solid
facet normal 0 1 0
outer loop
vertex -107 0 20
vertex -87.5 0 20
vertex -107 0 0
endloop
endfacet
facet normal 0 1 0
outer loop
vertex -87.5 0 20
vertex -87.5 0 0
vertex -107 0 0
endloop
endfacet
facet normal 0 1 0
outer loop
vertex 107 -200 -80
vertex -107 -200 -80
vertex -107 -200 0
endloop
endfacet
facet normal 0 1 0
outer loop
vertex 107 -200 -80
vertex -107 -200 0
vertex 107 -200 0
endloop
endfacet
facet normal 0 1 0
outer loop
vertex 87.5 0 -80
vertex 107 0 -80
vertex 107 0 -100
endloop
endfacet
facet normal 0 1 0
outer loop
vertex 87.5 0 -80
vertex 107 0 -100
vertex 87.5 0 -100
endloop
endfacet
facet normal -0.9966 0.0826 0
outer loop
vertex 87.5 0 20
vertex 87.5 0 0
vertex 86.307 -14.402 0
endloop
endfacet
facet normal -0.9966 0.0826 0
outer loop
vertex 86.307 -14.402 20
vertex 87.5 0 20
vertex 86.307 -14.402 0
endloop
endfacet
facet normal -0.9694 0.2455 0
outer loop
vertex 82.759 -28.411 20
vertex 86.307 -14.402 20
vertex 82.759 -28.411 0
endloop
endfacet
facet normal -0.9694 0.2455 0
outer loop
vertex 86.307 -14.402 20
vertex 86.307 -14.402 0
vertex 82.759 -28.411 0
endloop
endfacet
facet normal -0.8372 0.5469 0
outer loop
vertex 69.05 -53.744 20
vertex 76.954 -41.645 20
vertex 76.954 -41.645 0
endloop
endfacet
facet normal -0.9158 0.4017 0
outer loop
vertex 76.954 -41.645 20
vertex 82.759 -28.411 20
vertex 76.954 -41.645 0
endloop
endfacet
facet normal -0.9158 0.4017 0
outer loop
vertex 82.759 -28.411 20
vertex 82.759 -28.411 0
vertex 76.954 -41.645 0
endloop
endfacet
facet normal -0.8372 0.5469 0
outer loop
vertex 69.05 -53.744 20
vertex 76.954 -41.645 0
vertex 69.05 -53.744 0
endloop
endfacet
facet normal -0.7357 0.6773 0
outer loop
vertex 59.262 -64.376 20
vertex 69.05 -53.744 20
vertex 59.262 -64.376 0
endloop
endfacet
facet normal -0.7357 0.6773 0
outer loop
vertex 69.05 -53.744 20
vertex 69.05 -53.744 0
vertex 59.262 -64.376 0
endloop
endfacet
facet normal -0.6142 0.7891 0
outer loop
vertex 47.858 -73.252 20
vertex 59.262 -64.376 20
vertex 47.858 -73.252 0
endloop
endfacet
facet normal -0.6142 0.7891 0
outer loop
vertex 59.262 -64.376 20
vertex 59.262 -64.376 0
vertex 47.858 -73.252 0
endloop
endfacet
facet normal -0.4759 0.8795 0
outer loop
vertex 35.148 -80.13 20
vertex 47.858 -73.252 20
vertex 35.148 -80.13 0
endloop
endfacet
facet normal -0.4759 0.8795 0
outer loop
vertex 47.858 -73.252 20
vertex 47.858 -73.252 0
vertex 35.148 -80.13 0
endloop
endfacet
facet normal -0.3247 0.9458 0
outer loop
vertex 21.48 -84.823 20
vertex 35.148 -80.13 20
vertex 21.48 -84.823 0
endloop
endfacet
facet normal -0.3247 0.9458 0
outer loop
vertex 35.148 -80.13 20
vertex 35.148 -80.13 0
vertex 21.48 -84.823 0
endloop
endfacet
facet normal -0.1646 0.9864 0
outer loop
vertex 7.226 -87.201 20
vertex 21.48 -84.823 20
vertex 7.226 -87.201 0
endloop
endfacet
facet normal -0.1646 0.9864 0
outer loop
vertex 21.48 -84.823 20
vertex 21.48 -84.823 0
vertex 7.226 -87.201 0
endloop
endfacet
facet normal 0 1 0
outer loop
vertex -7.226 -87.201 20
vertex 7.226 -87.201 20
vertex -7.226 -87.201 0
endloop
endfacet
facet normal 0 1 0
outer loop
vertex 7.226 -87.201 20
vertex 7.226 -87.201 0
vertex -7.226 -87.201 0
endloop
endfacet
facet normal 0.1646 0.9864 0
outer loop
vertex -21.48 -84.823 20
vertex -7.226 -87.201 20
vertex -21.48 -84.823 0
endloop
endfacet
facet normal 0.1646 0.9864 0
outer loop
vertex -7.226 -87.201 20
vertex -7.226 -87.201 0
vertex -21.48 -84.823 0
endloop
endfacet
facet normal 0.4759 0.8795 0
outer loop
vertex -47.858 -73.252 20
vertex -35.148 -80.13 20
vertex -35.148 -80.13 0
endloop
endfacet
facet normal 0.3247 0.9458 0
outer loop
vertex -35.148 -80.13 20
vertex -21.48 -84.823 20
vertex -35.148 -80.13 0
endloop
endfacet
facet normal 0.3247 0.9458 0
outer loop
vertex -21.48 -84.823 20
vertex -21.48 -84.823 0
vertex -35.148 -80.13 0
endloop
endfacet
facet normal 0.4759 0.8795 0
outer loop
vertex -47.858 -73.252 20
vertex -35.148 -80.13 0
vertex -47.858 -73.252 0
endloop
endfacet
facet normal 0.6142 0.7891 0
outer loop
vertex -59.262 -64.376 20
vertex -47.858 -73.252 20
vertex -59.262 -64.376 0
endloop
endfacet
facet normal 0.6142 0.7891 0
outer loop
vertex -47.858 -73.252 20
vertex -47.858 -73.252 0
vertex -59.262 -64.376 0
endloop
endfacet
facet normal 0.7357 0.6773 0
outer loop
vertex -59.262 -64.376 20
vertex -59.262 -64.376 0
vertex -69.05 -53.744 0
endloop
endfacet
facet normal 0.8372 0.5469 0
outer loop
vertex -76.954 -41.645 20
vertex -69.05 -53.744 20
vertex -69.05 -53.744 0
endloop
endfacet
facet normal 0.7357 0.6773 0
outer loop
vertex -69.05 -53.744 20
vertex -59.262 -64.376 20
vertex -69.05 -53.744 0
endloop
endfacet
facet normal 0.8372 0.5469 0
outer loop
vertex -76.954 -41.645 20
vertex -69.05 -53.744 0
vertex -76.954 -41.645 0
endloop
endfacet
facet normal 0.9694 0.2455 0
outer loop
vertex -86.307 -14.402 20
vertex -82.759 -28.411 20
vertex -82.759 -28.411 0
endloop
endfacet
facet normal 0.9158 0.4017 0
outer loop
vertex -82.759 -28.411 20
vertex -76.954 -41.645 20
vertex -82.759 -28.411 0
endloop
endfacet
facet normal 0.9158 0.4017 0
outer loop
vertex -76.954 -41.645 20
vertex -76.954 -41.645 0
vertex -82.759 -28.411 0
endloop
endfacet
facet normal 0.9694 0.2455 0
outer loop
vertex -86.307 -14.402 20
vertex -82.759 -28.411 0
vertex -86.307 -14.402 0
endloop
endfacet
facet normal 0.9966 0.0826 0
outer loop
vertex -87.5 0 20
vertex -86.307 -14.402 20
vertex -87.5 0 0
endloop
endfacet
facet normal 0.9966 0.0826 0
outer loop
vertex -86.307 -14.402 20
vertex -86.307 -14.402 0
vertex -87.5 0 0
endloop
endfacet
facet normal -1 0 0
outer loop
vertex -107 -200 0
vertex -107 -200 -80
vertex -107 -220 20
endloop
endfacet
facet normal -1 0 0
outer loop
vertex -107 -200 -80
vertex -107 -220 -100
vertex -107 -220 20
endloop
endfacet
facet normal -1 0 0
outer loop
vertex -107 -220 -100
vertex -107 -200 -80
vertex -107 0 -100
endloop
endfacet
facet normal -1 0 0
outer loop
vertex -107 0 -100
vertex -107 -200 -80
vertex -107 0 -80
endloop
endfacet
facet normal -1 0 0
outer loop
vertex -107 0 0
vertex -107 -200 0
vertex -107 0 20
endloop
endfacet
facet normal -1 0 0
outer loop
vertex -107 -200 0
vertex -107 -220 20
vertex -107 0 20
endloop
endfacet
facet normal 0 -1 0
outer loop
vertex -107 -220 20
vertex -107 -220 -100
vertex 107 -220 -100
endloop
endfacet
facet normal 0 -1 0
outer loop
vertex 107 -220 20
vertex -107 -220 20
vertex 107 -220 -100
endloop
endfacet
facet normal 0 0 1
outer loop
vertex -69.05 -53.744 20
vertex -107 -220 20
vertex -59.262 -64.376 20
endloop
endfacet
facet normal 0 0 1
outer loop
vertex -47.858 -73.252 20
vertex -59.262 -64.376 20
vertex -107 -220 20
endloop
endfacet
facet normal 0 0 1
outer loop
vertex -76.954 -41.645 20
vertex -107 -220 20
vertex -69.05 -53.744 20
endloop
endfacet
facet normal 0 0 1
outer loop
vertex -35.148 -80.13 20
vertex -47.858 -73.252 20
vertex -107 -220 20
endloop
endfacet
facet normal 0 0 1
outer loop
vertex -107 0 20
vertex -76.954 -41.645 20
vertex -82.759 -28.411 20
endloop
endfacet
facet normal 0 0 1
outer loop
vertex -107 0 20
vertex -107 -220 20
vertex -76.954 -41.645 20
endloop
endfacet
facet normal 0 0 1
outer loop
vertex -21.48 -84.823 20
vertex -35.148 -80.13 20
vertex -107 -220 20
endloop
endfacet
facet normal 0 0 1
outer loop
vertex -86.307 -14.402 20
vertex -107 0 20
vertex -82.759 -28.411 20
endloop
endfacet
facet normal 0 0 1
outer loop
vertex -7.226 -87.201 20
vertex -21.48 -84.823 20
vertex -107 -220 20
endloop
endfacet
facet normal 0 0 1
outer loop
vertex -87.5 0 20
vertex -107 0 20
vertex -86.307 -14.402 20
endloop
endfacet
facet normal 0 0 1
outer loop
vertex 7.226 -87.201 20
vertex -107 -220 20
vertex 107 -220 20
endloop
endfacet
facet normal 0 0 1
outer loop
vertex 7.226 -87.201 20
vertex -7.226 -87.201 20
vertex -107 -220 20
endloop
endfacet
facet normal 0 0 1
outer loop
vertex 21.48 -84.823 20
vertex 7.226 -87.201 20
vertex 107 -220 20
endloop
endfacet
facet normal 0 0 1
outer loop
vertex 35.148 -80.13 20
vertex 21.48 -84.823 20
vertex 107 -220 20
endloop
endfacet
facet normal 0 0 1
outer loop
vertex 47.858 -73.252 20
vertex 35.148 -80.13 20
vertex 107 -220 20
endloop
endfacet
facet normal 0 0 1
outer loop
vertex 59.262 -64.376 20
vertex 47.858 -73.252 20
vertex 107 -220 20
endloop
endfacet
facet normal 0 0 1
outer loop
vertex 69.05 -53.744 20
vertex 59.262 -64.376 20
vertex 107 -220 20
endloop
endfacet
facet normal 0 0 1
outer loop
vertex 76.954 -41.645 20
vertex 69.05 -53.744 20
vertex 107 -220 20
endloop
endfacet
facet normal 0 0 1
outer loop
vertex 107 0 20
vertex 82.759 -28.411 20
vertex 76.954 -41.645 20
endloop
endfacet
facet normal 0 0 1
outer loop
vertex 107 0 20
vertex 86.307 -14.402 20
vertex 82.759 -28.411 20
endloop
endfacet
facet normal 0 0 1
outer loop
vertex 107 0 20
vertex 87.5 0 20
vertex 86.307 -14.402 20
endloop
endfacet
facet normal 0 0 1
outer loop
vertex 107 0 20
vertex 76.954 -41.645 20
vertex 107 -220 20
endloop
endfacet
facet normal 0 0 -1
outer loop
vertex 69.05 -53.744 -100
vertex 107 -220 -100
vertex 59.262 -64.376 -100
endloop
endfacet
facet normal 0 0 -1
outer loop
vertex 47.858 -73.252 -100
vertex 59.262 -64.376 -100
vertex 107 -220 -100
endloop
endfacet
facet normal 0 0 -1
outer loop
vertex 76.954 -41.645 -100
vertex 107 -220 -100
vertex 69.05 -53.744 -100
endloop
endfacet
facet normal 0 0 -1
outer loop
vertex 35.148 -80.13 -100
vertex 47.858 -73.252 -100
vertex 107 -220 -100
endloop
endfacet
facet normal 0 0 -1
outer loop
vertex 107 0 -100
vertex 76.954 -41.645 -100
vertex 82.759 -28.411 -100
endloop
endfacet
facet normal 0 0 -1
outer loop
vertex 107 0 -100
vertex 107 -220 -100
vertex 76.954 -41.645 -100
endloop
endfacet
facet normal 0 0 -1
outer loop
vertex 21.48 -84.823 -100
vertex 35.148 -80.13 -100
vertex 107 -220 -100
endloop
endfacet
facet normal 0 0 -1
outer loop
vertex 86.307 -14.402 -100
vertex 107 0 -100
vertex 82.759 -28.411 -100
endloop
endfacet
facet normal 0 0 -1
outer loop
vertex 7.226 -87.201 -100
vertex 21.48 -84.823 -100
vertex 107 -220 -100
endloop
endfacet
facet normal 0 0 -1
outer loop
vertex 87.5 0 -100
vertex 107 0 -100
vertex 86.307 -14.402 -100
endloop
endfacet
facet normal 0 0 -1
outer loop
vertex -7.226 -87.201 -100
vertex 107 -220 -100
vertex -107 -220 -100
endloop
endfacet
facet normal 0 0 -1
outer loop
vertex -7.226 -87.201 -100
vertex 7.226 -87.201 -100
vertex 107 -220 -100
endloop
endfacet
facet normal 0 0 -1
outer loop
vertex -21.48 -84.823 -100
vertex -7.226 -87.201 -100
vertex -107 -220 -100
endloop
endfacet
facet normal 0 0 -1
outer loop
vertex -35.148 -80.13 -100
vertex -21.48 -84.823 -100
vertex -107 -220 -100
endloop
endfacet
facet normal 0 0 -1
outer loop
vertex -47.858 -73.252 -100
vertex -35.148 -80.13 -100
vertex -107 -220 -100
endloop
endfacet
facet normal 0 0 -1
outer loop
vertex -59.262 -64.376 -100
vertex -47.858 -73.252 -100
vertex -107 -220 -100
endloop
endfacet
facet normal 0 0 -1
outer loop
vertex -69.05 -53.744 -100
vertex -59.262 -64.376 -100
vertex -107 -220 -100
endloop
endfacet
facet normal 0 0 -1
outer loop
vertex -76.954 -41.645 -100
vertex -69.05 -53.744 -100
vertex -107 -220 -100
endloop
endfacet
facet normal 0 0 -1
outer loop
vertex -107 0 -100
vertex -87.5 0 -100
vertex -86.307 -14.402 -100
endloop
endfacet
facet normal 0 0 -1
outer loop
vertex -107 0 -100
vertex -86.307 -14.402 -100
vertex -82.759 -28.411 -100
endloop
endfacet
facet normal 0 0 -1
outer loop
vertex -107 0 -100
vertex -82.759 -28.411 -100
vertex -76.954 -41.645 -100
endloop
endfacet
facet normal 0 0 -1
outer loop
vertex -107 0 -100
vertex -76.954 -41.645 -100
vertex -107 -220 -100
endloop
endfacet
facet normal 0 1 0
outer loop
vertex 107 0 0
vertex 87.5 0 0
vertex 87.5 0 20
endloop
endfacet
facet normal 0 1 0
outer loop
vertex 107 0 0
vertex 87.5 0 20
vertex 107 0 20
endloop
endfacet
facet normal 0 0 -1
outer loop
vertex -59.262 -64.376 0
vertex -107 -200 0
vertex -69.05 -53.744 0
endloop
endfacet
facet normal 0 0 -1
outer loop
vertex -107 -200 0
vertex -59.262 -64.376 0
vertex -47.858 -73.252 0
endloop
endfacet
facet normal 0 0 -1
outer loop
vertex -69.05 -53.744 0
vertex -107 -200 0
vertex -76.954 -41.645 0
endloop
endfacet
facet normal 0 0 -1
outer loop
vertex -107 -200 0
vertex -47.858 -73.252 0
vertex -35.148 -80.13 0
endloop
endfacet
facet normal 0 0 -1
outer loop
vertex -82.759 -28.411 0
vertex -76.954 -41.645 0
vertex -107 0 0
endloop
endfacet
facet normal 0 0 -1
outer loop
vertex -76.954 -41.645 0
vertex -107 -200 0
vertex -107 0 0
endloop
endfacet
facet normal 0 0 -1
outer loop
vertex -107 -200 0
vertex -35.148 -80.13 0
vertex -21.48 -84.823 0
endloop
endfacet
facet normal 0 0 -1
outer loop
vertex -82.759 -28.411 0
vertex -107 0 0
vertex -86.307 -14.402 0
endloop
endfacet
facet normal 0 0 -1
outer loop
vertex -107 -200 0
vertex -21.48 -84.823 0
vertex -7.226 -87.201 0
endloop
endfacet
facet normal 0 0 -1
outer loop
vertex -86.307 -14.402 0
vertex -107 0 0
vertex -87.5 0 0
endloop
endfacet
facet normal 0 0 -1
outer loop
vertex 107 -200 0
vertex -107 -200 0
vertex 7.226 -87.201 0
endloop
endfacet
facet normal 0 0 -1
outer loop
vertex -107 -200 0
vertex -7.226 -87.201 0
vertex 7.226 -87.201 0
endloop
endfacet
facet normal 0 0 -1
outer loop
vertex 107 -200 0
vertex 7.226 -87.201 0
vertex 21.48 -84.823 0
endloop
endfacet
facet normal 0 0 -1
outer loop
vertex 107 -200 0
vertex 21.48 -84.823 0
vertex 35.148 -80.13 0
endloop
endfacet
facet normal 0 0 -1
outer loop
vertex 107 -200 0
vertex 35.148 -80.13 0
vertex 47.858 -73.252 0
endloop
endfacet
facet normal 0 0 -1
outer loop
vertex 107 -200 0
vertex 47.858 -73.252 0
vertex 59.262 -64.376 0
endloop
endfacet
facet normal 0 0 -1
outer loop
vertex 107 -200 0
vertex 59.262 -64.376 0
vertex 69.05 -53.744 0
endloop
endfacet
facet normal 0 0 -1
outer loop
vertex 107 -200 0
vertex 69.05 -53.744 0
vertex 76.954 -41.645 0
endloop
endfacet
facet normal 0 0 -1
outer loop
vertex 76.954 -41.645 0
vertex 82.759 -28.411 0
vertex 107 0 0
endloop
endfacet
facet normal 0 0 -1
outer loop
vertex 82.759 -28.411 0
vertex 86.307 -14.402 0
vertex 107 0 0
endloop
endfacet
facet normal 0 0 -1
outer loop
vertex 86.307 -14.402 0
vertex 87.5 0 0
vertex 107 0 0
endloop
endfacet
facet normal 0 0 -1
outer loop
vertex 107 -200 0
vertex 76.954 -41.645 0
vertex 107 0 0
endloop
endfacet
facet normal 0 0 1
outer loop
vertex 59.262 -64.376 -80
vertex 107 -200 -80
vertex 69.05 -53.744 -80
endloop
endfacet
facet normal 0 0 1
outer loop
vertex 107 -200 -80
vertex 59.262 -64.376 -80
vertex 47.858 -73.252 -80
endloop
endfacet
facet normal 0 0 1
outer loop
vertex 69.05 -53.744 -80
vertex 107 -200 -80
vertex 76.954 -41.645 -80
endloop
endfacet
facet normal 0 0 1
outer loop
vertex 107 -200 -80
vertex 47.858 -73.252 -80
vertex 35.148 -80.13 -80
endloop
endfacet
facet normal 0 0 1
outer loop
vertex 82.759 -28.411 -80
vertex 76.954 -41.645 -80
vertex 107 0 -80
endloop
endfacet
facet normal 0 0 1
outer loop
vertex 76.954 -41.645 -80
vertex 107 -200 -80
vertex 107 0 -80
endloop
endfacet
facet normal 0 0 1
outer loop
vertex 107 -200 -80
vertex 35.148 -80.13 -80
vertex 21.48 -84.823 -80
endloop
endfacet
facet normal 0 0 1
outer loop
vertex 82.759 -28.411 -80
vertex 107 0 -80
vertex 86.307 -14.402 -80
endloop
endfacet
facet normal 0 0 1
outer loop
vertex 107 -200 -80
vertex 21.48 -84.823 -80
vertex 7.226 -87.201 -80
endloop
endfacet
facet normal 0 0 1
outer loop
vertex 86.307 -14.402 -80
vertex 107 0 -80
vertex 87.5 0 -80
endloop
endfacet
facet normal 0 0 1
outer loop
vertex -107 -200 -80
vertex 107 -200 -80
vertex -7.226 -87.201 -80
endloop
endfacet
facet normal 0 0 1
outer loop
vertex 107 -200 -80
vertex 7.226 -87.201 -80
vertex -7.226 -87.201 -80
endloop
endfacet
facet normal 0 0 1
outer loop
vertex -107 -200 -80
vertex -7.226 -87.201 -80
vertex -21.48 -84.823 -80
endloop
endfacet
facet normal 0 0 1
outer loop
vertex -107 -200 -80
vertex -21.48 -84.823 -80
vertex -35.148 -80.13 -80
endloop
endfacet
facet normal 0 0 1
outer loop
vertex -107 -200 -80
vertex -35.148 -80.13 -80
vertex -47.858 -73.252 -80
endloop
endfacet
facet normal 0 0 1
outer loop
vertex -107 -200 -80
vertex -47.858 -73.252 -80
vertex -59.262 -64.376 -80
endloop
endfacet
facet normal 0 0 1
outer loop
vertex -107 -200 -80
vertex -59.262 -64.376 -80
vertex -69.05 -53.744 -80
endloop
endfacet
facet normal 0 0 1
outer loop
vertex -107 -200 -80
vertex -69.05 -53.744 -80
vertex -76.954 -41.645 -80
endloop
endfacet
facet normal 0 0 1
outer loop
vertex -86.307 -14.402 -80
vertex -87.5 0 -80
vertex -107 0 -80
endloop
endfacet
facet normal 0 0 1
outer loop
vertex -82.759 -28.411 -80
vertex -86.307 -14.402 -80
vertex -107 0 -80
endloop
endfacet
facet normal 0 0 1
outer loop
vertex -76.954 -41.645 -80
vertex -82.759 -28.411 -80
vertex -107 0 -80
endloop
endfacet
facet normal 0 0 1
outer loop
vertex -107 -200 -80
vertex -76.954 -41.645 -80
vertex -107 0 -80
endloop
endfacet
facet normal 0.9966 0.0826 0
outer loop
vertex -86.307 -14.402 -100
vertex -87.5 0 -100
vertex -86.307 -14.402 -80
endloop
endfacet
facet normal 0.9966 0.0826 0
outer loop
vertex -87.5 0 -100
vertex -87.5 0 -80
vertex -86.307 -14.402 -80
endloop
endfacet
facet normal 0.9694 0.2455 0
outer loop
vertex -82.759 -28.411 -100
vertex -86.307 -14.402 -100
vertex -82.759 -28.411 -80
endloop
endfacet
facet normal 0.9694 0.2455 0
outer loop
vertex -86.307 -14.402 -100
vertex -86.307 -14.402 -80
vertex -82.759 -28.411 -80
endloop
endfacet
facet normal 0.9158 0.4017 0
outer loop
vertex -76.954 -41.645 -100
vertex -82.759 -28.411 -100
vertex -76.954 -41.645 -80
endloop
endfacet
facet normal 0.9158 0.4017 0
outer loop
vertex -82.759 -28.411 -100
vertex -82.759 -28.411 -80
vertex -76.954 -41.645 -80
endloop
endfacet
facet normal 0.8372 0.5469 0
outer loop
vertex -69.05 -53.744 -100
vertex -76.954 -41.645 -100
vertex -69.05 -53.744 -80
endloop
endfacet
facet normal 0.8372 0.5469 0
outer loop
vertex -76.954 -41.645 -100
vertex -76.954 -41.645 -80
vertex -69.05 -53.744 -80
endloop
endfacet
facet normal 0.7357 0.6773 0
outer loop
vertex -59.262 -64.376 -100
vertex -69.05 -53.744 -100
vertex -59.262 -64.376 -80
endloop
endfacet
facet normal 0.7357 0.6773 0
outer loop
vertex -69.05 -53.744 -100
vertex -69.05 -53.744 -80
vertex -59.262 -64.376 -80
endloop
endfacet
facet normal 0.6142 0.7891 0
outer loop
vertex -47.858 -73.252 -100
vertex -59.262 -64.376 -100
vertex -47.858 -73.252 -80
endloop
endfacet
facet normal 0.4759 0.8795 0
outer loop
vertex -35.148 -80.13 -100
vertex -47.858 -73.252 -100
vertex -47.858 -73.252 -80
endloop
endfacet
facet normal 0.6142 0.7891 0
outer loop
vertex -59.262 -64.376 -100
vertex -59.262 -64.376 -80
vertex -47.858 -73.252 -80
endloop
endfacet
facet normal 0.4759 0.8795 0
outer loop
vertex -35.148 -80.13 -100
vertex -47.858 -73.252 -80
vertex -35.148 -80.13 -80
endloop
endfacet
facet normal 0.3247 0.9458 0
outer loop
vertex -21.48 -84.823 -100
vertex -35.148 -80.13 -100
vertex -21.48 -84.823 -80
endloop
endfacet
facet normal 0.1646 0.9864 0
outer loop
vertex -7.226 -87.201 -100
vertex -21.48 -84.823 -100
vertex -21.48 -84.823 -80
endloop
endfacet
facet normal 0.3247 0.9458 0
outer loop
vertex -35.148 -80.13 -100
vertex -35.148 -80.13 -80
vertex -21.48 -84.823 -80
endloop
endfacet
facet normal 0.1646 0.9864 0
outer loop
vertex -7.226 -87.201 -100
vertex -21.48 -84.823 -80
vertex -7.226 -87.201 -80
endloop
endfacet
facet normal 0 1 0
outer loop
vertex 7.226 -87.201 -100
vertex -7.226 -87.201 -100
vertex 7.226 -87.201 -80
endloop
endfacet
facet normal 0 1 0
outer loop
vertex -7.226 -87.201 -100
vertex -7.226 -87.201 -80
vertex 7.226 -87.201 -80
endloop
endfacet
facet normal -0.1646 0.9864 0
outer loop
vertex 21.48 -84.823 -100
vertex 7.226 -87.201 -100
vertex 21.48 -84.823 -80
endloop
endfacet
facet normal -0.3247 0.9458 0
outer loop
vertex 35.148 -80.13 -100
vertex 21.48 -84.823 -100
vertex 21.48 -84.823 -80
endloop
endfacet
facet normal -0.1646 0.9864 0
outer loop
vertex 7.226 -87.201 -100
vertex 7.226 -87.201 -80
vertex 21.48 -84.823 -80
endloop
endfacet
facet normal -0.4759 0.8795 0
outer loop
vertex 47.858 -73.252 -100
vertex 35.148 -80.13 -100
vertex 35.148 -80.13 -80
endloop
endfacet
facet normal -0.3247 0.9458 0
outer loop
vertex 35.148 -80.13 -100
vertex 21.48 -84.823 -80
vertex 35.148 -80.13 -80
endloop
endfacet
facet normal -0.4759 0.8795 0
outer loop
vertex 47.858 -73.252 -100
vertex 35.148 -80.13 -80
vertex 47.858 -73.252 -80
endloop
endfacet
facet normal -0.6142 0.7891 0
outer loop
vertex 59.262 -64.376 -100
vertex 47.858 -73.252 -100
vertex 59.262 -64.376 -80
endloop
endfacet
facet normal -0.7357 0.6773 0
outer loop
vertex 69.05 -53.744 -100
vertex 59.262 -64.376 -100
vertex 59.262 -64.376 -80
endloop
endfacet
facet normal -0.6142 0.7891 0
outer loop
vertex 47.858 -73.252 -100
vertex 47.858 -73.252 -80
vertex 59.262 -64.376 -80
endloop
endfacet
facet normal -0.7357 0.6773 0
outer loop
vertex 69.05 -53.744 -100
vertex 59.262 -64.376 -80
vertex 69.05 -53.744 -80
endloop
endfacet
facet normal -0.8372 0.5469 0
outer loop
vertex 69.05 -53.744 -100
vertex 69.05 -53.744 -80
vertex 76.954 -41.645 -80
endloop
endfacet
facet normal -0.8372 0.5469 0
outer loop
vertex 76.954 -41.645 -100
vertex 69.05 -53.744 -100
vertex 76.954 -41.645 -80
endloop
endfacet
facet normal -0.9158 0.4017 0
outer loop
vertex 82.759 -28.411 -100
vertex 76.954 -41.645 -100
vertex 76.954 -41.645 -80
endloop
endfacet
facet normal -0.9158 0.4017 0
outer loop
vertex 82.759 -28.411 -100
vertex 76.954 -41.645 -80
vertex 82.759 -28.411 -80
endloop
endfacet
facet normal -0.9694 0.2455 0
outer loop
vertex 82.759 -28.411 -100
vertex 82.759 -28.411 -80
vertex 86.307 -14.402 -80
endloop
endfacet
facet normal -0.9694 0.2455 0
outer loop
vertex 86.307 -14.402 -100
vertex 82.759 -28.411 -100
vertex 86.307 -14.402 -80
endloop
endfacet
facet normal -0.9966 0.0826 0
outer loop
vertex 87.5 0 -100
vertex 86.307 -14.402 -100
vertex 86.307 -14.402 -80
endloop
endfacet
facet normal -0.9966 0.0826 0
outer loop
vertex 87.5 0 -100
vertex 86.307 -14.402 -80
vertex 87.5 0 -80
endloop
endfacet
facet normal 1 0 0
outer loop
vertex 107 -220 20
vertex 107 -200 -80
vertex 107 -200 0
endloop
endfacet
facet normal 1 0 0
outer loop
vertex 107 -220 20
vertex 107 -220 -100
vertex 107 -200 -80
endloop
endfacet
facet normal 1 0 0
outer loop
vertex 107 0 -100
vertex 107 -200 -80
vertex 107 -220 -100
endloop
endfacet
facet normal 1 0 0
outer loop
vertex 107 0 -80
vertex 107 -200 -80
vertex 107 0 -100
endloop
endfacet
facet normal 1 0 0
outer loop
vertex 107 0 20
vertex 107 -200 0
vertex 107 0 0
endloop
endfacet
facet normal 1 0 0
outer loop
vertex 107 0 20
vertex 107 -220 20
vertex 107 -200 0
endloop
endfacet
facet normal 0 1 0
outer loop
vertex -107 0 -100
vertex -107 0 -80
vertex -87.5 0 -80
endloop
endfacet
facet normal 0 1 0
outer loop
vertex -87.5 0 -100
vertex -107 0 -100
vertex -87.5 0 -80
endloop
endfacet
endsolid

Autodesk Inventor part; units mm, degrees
ref_plane "YZ Plane" through (0, 0, 0) normal (1, 0, 0) x (0, 1, 0)
ref_plane "XZ Plane" through (0, 0, 0) normal (0, 1, 0) x (-1, 0, 0)
sketch "Sketch1" plane through (0, 0, 0) normal (0, 0, 1) x (1, 0, 0)
  arc A0 (-87.5, 0) -> (87.5, 0) centre (0, 0) ccw
  line L0 (-87.5, 0) -> (87.5, 0) construction
  line L1 (-87.5, -200) -> (87.5, -200)
  line L2 (-87.5, -220) -> (87.5, -220)
  line L3 (-87.5, 0) -> (-107.5, 0)
  line L4 (0, 0) -> (-107, 0)
  line L5 (-107, 0) -> (-107, -200)
  line L6 (-107, -200) -> (-87.5, -200)
  line L7 (-107, -200) -> (-107, -220)
  line L8 (-107, -220) -> (-87.5, -220)
  line L9 (0, 0) -> (107, 0)
  line L10 (107, 0) -> (107, -220)
  line L11 (107, -220) -> (87.5, -220)
  line L12 (87.5, -200) -> (107, -200)
  point P0 (87.5, 0)
  dimension "d0" = 175
  dimension "d1" = 200
  dimension "d9" = 107
  dimension "d10" = 107
  dimension "d13" = 90
  dimension "d15" = 200
  dimension "d17" = 200
  dimension "d18" = 214.5
  dimension "d21" = 20
extrude "Extrusion1" add sketch "Sketch1" along normal blind 20 contours A0 L9 L10 L12 L1 L6 L5 L3
extrude "Extrusion2" add sketch "Sketch1" along normal blind 20 and the other way blind 100 contours L6 L1 L12 L10 L11 L2 L8 L7
ref_plane "Work Plane1" through (0, 0, -40) normal (0, 0, -1) x (1, 0, 0)
mirror "Mirror1" about plane through (0, 0, -40) normal (0, 0, -1) of "Extrusion1"
properties part number "Support" material "Stainless Steel"
